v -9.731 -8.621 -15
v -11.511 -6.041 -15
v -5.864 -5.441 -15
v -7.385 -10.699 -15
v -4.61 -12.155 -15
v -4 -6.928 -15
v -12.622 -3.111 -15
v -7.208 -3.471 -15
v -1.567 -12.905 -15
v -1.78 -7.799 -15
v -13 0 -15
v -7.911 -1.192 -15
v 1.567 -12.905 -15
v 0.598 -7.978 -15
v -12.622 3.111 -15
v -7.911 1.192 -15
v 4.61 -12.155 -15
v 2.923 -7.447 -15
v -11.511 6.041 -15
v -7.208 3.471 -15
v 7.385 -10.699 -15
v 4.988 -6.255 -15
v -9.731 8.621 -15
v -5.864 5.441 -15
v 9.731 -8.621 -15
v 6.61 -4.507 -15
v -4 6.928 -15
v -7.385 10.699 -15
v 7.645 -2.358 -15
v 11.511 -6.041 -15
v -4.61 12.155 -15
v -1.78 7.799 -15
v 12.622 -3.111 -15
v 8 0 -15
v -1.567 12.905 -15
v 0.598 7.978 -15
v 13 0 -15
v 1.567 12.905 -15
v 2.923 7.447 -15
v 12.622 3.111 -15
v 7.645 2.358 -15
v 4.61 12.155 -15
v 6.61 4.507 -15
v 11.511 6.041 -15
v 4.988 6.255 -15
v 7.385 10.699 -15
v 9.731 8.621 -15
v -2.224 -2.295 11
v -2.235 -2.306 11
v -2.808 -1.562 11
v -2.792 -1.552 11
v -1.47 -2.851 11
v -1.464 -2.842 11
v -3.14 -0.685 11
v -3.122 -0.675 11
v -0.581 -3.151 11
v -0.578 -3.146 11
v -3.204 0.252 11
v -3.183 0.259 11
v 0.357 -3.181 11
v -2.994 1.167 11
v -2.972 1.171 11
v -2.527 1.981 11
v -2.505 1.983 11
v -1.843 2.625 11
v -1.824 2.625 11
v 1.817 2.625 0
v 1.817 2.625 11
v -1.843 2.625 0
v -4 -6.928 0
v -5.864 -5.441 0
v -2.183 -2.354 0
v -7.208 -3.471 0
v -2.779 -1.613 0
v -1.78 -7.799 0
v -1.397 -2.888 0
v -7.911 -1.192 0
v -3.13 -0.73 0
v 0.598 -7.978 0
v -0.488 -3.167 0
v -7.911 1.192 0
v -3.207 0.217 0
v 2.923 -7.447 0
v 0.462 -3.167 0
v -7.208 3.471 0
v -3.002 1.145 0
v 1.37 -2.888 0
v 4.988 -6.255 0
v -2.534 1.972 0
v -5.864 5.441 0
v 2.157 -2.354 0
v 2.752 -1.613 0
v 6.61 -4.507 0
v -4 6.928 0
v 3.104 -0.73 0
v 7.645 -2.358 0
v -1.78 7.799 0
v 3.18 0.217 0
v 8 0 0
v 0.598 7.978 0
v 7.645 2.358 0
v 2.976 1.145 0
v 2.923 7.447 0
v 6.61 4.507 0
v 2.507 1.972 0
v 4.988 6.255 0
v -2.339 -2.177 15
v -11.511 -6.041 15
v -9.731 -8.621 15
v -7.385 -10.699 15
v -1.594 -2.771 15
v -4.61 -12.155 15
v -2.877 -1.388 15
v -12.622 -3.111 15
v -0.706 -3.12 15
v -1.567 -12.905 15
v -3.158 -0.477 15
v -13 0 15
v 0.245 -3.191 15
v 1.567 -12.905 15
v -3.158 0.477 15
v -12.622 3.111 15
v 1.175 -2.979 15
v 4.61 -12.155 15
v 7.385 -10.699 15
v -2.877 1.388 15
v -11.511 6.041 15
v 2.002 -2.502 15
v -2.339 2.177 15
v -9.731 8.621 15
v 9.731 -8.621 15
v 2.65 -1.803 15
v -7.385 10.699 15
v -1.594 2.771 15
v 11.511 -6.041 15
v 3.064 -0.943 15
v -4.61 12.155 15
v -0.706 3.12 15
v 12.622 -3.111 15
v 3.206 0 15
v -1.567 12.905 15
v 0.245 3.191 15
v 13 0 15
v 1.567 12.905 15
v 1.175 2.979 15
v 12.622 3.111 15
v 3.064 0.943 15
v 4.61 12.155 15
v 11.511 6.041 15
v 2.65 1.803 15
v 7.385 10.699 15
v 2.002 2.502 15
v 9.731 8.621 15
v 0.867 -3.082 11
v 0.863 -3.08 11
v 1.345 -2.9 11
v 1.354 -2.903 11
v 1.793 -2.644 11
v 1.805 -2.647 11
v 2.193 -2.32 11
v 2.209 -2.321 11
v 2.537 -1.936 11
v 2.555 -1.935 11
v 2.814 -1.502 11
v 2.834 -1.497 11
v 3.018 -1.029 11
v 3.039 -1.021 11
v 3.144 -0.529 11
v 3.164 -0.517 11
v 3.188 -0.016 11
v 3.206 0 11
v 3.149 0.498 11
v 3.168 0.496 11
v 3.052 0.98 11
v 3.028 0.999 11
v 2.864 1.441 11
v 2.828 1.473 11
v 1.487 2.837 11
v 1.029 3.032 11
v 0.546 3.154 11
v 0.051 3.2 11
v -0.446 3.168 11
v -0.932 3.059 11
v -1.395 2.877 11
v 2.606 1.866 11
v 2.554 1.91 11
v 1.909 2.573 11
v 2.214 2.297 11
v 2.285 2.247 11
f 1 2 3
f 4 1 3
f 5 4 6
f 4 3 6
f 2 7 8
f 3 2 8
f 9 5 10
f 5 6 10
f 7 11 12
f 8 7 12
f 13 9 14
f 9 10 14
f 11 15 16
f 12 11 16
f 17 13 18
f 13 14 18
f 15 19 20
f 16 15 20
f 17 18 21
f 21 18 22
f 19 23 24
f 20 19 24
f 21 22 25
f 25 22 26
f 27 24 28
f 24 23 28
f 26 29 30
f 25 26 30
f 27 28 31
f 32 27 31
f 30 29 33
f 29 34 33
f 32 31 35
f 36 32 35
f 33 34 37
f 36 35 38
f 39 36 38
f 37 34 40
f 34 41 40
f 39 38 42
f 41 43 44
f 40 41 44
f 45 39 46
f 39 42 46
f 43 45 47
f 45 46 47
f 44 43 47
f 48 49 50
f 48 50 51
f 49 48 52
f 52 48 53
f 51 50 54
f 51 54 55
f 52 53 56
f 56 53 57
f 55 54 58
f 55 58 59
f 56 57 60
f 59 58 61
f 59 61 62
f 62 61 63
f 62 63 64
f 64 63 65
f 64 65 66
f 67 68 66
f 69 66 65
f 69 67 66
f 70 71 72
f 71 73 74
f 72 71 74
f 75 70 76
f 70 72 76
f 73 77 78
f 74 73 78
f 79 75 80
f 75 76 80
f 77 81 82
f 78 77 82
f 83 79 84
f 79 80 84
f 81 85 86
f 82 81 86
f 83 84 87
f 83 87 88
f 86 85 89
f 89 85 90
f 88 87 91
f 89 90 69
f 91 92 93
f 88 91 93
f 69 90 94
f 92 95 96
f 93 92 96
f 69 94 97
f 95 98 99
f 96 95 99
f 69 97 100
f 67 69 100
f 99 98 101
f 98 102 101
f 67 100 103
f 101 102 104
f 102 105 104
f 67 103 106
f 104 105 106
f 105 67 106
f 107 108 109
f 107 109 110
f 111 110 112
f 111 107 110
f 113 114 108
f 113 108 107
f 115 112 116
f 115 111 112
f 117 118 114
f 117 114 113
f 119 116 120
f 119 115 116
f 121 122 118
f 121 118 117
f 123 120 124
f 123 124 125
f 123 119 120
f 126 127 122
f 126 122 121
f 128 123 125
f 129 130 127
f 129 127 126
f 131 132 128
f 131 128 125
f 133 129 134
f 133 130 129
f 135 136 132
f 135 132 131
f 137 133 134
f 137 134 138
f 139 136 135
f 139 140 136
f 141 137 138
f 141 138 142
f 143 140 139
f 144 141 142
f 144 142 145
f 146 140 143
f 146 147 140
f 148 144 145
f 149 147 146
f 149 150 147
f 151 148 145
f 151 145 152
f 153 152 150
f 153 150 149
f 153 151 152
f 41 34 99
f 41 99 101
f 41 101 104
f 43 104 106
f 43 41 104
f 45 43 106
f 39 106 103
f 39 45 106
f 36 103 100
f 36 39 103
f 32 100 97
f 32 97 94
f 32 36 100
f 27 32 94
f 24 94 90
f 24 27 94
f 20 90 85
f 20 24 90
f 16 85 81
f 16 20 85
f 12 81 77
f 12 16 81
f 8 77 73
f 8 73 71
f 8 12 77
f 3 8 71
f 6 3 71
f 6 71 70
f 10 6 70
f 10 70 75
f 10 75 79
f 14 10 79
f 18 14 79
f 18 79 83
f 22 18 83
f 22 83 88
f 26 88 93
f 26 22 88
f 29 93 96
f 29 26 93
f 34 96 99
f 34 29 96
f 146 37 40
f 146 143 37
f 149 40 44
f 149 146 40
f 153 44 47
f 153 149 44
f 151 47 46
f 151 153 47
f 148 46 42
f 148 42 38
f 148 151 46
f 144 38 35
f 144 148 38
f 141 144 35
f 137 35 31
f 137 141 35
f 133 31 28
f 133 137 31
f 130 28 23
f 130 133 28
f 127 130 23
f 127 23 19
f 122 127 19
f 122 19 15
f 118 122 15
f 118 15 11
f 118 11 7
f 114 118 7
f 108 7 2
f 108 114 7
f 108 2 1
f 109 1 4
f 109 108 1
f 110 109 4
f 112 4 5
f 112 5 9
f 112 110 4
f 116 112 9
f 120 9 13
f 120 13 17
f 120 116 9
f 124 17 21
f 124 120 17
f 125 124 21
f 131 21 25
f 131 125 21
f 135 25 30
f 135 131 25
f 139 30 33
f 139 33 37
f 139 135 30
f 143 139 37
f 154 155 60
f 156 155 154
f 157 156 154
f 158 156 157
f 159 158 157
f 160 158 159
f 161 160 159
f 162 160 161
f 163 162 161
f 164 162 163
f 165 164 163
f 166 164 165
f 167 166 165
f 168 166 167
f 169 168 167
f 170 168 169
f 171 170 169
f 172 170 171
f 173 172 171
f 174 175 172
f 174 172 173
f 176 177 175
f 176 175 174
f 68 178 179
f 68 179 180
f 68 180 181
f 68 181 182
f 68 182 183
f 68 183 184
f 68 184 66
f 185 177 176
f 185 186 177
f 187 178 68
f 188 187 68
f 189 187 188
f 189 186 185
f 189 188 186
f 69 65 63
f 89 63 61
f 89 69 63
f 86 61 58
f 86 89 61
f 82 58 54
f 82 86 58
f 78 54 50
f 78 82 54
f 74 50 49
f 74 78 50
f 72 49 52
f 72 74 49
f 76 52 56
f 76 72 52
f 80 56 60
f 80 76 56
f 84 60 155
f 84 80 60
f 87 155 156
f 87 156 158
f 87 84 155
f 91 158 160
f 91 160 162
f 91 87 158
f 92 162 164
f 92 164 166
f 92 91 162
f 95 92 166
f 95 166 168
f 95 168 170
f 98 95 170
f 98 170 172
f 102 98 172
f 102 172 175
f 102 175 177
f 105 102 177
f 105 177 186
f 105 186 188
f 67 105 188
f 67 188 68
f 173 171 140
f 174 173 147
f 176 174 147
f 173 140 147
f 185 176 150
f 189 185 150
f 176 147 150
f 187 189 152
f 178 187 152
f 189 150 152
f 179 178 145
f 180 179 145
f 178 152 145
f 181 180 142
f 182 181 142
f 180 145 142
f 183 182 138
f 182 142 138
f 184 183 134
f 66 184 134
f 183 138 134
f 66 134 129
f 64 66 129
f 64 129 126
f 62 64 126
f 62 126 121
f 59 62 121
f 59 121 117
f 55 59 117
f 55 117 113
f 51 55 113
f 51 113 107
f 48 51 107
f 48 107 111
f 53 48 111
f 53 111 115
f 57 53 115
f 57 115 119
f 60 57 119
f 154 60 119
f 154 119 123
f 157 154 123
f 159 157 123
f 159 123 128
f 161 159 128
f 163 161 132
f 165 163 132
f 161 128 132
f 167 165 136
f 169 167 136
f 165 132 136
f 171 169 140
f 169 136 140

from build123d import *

# Parameters (mm, degrees)
F0_R     = 13
F5_DEPTH = 15
F4_R     = 8
F6_DEPTH = 15
F3_R     = 3.2
F8_DEPTH = 4
F9_DEPTH = 11


with BuildPart() as f5:
    # F0 (on Top) → F5 (new body, symmetric)
    with BuildSketch(Plane.XY):
        Circle(F0_R)
    extrude(amount=F5_DEPTH, both=True)

    # F4 (on offset) → F6 (cut)
    with BuildSketch(Plane.XY.offset(-15)):
        Circle(F4_R)
    extrude(amount=F6_DEPTH, mode=Mode.SUBTRACT)

    # F3 (on offset) → F8 (cut)
    with BuildSketch(Plane.XY.offset(15)):
        with Locations((0.0063437128, 0)):
            Circle(F3_R)
    extrude(amount=-F8_DEPTH, mode=Mode.SUBTRACT)

    # F7 (on Top) → F9 (cut)
    with BuildSketch(Plane.XY):
        with BuildLine():
            Line((1.8168599408, 2.625), (-1.8433996128, 2.625))
            ThreePointArc((-1.8433996128, 2.625), (-0.013269836, -3.2022189551), (1.8168599408, 2.625))
        make_face()
    extrude(amount=F9_DEPTH, mode=Mode.SUBTRACT)


solid = f5.part
